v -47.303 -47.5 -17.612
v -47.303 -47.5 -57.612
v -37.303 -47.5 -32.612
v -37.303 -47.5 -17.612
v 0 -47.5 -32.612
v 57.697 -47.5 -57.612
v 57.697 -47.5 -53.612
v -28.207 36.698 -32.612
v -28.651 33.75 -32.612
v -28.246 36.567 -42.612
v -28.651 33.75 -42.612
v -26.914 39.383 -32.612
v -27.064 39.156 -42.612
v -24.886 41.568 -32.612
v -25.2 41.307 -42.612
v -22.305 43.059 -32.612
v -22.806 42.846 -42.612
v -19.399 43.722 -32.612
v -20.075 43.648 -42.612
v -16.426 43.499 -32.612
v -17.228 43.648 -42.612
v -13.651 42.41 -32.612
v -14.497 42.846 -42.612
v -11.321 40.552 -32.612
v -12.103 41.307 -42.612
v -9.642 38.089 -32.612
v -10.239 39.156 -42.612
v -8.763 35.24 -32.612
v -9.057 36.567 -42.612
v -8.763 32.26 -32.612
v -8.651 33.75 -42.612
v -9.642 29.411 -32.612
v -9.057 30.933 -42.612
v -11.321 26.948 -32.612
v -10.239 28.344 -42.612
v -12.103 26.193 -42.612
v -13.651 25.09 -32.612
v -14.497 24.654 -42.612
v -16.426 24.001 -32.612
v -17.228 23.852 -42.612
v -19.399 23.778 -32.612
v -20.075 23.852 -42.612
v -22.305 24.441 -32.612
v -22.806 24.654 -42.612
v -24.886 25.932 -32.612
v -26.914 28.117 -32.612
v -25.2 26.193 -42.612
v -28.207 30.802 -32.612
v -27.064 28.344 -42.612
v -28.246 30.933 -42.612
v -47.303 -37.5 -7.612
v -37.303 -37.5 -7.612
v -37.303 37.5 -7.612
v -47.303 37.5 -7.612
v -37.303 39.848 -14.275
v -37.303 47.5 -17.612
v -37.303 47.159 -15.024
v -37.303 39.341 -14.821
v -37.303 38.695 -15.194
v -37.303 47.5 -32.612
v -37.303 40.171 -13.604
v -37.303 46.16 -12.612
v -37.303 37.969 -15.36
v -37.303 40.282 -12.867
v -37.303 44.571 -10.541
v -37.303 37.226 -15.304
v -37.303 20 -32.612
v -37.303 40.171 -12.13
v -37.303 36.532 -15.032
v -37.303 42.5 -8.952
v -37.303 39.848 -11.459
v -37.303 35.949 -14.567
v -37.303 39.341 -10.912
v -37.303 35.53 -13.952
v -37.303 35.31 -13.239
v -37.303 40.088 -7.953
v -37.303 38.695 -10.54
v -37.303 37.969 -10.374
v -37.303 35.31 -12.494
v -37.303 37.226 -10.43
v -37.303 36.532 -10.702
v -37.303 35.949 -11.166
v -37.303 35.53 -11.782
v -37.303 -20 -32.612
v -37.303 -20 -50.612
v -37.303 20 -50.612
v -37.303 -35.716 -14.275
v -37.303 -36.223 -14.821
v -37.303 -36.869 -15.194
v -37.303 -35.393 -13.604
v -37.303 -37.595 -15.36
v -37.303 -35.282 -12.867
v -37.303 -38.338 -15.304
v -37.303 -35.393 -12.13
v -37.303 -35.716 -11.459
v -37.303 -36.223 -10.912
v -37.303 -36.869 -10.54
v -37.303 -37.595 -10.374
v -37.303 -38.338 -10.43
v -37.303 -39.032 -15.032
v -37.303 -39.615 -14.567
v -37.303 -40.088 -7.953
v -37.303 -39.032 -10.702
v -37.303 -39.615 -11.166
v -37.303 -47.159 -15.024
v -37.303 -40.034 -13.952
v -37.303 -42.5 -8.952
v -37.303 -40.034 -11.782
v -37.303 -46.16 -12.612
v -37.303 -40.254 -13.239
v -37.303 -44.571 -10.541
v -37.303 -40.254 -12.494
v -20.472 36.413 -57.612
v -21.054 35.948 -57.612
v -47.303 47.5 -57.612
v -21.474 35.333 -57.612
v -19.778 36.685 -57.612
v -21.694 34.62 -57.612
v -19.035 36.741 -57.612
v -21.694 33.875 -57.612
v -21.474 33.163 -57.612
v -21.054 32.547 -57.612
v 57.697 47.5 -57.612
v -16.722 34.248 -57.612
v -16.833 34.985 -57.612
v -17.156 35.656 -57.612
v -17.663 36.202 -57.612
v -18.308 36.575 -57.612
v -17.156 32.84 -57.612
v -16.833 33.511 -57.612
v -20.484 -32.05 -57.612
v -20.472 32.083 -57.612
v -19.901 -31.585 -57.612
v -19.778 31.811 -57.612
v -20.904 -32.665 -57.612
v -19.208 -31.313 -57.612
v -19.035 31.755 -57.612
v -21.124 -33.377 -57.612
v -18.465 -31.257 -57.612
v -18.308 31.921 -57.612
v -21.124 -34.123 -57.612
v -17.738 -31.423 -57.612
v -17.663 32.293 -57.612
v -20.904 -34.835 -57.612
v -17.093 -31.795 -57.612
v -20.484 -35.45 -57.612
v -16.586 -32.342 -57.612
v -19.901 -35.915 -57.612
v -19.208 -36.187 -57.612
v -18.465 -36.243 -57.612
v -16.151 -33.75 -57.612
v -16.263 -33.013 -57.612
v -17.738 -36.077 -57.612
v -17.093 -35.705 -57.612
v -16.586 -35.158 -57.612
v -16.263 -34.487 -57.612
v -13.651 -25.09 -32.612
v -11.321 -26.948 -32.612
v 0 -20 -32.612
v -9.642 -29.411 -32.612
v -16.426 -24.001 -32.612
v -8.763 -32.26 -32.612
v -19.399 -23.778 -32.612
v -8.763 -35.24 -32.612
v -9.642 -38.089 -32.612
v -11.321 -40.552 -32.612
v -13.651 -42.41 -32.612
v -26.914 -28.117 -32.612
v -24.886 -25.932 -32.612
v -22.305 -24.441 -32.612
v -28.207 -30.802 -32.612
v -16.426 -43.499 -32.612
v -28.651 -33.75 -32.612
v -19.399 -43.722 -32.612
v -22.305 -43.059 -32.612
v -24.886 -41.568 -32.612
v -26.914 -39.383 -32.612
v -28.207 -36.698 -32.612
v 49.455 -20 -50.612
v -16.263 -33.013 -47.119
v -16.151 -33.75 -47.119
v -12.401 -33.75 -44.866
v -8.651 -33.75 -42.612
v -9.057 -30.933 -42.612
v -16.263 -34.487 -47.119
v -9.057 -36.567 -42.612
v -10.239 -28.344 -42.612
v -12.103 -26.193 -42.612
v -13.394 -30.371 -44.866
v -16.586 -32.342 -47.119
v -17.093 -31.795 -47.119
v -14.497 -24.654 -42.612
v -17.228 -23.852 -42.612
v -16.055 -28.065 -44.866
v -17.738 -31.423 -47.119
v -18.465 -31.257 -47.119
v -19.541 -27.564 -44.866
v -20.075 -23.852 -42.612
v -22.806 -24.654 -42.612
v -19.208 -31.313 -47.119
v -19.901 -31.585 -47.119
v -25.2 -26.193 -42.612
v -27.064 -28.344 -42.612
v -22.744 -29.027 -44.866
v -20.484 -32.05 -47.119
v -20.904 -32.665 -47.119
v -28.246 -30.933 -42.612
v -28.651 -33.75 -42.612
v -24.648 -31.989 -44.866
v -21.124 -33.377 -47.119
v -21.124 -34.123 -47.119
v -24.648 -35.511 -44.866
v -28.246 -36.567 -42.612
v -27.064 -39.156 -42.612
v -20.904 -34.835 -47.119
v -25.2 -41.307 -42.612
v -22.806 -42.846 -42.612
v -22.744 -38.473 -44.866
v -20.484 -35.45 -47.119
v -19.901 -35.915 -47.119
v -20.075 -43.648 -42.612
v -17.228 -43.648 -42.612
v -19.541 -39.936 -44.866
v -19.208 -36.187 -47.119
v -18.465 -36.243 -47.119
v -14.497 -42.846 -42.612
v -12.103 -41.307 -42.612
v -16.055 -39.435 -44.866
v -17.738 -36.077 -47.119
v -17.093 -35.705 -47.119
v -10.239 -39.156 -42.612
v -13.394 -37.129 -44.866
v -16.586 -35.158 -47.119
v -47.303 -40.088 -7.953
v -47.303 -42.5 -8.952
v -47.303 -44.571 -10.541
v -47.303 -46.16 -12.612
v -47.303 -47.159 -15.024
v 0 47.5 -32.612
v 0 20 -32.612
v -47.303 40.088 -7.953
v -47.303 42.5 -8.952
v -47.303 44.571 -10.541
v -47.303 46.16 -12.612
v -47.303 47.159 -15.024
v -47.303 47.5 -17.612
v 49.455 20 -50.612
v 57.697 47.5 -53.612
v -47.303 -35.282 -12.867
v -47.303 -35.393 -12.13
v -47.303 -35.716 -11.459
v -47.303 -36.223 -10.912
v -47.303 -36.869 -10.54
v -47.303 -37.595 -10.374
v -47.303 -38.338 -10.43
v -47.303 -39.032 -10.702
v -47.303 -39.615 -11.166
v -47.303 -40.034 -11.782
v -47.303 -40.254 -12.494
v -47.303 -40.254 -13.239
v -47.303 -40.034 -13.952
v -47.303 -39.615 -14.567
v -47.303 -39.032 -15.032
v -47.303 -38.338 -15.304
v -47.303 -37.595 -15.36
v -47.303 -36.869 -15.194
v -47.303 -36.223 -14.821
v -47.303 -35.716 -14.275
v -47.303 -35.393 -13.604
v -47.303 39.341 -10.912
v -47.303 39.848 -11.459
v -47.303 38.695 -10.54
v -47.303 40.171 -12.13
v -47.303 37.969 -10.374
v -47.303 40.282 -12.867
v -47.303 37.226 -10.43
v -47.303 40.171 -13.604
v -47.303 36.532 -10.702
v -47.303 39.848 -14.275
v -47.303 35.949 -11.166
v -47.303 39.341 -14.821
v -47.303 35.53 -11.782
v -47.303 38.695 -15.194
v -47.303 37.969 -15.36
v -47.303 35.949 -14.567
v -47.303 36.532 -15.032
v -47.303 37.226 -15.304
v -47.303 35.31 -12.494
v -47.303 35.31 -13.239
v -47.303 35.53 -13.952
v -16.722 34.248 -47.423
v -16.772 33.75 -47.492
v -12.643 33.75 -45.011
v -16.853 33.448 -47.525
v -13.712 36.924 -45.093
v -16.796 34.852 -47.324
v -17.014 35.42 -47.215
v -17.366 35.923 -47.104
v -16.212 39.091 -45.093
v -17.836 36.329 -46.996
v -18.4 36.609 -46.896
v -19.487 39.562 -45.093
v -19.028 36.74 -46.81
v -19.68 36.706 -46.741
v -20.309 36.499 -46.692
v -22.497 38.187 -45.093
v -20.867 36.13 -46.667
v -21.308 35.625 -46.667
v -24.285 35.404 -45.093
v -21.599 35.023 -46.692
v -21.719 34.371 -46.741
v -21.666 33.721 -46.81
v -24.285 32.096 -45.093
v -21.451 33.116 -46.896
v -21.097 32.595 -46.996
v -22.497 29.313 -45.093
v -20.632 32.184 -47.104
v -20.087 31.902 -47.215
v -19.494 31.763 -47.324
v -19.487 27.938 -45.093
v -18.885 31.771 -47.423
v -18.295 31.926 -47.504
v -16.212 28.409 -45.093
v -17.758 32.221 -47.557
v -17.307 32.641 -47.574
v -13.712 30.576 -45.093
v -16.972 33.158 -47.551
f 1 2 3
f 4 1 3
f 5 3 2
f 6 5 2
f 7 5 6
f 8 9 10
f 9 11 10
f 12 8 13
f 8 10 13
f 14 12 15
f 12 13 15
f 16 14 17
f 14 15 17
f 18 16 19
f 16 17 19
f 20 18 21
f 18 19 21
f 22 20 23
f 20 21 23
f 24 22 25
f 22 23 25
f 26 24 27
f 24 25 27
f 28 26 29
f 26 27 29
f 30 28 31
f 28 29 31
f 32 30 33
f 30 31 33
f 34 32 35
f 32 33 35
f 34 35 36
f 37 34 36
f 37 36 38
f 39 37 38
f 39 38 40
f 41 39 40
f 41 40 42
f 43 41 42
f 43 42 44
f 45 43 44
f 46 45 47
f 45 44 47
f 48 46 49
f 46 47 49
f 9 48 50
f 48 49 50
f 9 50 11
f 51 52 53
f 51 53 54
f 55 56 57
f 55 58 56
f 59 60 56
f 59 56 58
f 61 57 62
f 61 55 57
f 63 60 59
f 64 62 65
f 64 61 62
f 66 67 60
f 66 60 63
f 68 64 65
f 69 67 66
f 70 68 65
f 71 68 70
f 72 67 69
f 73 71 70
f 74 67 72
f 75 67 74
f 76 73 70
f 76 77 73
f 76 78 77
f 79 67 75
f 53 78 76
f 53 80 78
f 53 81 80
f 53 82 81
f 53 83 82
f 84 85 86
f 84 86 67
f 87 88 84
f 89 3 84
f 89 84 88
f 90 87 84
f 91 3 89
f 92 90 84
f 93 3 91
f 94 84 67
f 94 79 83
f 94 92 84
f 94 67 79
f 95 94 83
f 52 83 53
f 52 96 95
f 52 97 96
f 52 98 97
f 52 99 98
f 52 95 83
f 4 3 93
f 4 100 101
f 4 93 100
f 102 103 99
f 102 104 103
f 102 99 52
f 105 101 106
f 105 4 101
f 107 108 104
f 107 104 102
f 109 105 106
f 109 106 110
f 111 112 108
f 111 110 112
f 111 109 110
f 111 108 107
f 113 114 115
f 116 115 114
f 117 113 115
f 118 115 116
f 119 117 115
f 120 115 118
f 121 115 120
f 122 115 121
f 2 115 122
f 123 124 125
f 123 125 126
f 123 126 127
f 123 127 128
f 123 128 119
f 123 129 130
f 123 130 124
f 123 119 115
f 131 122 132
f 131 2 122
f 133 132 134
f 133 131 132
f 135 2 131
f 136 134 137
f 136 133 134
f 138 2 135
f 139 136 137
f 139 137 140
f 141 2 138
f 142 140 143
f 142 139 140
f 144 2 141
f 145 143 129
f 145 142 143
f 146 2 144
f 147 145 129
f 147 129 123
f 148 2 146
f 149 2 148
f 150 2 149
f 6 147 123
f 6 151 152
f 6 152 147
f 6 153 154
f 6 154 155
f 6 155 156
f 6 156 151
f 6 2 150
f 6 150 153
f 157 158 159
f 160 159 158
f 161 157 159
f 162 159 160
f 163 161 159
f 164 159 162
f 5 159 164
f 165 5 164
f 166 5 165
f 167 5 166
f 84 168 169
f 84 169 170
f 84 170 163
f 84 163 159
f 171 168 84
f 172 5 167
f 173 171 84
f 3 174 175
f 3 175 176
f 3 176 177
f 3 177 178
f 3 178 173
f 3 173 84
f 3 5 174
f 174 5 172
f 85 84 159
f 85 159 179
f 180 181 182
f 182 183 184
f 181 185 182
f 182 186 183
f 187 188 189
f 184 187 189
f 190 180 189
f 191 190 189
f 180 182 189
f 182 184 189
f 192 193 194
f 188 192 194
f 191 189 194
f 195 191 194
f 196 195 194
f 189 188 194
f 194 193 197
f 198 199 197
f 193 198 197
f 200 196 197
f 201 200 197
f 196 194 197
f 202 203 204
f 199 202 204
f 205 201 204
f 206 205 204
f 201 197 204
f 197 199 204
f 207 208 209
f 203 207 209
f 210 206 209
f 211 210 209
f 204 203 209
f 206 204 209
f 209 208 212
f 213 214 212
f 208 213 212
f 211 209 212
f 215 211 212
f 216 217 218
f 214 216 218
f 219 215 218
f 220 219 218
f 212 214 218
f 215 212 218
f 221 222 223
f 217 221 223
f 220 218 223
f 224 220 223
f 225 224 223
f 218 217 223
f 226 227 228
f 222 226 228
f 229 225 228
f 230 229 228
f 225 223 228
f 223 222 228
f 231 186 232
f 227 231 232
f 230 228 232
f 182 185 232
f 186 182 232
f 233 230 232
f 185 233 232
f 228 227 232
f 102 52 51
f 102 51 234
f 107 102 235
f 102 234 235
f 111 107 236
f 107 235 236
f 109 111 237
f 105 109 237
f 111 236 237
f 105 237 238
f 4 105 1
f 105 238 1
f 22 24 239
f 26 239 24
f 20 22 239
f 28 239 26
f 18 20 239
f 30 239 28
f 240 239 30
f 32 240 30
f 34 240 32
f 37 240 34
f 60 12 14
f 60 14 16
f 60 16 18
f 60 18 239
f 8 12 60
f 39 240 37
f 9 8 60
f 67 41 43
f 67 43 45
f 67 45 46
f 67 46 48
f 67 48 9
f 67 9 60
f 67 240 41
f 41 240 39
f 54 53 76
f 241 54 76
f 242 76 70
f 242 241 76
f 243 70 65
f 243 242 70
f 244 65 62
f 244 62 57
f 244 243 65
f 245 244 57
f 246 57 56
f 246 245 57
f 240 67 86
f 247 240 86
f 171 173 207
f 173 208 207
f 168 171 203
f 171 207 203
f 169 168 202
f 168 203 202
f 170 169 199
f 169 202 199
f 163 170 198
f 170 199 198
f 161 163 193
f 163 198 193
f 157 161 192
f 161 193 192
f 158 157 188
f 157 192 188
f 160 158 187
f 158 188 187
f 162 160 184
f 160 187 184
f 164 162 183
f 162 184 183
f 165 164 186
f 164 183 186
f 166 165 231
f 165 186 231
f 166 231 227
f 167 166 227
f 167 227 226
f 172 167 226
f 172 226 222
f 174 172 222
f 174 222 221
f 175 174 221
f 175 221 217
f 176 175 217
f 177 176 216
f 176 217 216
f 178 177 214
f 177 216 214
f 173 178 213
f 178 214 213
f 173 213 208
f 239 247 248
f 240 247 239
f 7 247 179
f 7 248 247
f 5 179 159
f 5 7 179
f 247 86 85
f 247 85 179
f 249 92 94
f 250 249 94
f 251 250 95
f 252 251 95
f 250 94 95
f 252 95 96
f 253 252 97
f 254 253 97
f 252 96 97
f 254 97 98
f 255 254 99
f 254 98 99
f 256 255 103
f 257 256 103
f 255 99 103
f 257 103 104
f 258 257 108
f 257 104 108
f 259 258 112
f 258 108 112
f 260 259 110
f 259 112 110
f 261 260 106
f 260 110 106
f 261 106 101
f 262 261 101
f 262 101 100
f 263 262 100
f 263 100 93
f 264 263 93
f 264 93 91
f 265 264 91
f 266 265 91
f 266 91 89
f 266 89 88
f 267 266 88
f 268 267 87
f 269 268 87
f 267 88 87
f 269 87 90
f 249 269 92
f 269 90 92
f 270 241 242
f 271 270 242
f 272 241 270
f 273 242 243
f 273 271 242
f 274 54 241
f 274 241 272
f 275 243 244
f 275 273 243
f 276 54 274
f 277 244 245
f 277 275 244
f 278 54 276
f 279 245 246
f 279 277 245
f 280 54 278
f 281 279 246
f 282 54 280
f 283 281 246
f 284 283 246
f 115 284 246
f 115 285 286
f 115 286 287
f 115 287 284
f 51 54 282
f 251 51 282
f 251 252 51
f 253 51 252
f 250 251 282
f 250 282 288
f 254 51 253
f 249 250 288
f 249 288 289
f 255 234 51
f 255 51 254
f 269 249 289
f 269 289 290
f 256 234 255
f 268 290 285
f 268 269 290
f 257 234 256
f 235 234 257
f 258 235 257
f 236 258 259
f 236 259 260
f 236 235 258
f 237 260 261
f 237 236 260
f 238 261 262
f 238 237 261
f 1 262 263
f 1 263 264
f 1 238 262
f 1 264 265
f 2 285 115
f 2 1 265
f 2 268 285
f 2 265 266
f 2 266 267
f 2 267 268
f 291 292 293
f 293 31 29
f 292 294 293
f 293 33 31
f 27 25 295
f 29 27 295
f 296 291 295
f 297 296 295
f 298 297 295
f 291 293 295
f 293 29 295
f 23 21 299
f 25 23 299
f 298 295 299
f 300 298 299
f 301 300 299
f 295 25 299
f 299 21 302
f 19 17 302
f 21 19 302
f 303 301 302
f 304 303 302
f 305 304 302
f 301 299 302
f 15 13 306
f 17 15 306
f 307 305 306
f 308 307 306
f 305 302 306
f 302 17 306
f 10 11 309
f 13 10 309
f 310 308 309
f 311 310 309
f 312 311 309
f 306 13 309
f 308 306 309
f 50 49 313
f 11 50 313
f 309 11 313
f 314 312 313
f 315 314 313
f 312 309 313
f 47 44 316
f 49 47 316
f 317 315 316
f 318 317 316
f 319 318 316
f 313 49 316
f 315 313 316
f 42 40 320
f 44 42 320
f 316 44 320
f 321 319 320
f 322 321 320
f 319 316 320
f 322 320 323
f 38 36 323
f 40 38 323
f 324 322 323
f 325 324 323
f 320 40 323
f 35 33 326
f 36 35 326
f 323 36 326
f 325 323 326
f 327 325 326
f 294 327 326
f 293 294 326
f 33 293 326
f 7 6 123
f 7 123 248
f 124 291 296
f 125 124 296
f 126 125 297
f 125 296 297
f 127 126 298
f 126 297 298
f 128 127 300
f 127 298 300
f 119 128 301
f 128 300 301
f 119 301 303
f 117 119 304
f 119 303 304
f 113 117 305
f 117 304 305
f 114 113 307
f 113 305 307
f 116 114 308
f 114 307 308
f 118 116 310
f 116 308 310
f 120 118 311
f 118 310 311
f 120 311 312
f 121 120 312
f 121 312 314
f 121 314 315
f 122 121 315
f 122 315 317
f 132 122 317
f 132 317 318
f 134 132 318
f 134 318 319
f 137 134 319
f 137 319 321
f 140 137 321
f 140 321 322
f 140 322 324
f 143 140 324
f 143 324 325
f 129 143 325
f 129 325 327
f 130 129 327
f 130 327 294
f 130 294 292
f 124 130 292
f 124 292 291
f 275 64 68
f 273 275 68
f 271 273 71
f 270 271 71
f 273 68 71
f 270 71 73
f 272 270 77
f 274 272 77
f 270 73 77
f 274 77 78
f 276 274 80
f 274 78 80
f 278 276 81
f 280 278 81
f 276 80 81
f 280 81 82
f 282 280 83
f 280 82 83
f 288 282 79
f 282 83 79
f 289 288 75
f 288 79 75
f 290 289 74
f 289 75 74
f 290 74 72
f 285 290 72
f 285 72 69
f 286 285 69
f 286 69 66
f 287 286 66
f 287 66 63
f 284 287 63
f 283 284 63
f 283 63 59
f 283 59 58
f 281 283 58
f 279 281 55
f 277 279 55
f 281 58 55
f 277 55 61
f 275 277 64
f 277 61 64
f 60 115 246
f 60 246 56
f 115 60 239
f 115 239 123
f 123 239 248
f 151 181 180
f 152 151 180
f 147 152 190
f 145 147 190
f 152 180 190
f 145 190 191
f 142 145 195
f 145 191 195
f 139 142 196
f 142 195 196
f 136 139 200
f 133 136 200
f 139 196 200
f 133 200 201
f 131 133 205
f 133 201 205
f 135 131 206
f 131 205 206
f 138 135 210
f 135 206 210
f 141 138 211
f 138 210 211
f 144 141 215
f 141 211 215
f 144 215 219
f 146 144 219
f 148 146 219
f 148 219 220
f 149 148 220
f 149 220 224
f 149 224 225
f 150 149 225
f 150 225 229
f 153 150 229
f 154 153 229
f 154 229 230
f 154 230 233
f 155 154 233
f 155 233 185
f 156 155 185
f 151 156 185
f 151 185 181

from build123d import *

# Parameters (mm, degrees)
F1_DEPTH  = 47.5
F2_W      = 86.76
F2_H      = 40
F3_DEPTH  = 18
F4_R      = 10
F5_R      = 2.5
F6_DEPTH  = 10
F8_D      = 20
F8_DEPTH  = 10
F8_TIP    = 6.0086061903
F9_R      = 2.5
F10_DEPTH = 25
F12_D     = 20
F12_DEPTH = 10
F12_TIP   = 6.0086061903
F13_R     = 2.5
F14_DEPTH = 25


with BuildPart() as f1:
    # F0 (on Front) → F1 (new body, symmetric)
    with BuildSketch(Plane.XZ):
        Polygon((-37.3029741915, -7.6123222187), (-47.3029741915, -7.6123222187), (-47.3029741915, -57.6123222187), (-37.3029741915, -57.6123222187), (-37.3029741915, -32.6123222187), align=None)
        Polygon((0, -32.6123222187), (-37.3029741915, -32.6123222187), (-37.3029741915, -57.6123222187), (57.6970258085, -57.6123222187), (57.6970258085, -53.6123222187), align=None)
    extrude(amount=F1_DEPTH, both=True)

    # F2 (on face) → F3 (cut)
    with BuildSketch(Plane.XY.offset(-32.6123222187)):
        with Locations((6.0770258085, 0)):
            Rectangle(F2_W, F2_H)
    extrude(amount=-F3_DEPTH, mode=Mode.SUBTRACT)

    # F4
    f4_edges = [f1.edges().sort_by_distance(p)[0] for p in [
        (-42.302974, -47.5, -7.612322),
        (-42.302974, 47.5, -7.612322),
    ]]
    fillet(f4_edges, radius=F4_R)

    # F5 (on face) → F6 (cut, through all)
    with BuildSketch(Plane.YZ.offset(-37.3029741915)):
        with Locations((-37.7820432186, -12.8668630496)):
            Circle(F5_R)
        with Locations((37.7820432186, -12.8668630496)):
            Circle(F5_R)
    extrude(amount=-F6_DEPTH, mode=Mode.SUBTRACT)

    # F8
    with Locations(Plane.XY.offset(-32.6123222187)):
        with Locations((-18.6514870957, -33.75)):
            Hole(F8_D / 2, depth=F8_DEPTH)
            with Locations((0, 0, -(F8_DEPTH + F8_TIP / 2))):  # 118° drill point
                Cone(0, F8_D / 2, F8_TIP, mode=Mode.SUBTRACT)

    # F9 (on face) → F10 (cut)
    with BuildSketch(Plane.XY.offset(-32.6123222187)):
        with Locations((-18.6514870957, -33.75)):
            Circle(F9_R)
    extrude(amount=-F10_DEPTH, mode=Mode.SUBTRACT)

    # F12
    with Locations(Plane.XY.offset(-32.6123222187)):
        with Locations((-18.6514870957, 33.75)):
            Hole(F12_D / 2, depth=F12_DEPTH)
            with Locations((0, 0, -(F12_DEPTH + F12_TIP / 2))):  # 118° drill point
                Cone(0, F12_D / 2, F12_TIP, mode=Mode.SUBTRACT)

    # F13 (on face) → F14 (cut)
    with BuildSketch(Plane.XY.offset(-32.6123222187)):
        with Locations((-19.2217435688, 34.2478714883)):
            Circle(F13_R)
    extrude(amount=-F14_DEPTH, mode=Mode.SUBTRACT)


solid = f1.part
